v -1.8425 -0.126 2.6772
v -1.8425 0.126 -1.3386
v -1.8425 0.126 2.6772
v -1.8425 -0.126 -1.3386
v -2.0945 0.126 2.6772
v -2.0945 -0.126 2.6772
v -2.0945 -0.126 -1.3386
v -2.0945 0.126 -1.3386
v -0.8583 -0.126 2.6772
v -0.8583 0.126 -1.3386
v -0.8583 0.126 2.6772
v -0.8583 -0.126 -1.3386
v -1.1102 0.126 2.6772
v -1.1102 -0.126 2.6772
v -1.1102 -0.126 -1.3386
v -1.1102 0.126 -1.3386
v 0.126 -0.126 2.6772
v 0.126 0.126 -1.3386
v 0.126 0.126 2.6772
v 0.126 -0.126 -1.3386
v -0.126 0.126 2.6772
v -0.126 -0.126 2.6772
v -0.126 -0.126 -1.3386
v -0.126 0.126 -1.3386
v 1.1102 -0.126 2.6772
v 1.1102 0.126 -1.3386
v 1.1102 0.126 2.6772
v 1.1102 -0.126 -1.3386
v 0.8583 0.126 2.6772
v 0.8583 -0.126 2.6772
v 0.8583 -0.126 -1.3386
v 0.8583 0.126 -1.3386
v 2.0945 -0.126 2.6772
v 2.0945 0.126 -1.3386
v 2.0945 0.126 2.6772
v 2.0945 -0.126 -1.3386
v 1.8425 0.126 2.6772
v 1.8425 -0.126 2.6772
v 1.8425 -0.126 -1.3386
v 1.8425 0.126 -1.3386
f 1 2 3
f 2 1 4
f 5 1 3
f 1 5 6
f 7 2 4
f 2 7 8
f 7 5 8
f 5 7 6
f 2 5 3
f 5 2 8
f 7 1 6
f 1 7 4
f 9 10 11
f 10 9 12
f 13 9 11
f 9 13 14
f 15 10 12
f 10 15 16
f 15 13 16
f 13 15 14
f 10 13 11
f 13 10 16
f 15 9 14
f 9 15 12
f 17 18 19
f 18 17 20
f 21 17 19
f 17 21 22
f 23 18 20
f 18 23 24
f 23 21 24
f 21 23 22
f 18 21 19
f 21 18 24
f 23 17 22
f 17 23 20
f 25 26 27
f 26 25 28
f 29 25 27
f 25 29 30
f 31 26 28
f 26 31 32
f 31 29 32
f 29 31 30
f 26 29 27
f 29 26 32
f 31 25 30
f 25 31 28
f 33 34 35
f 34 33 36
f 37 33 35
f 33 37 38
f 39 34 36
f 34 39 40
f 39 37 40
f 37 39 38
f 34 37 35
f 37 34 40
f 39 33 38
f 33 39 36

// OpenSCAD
// file: defines.scad
// example012.stl is Mblock.stl, (c) 2009 Will Langford
// licensed under the Creative Commons - GNU GPL license.
// http://www.thingiverse.com/thing:753

//import("sim800c.stl", convexity=3);

// PCB

A = 2.5;
B = 14.9;

scale = 1/2.54;
// main file
include <defines.scad>

pitch = 2.5;
p_w = 0.64;
p_h = 7.0;

module Pin(x, y) {
  translate([x - p_w/2, y - p_w/2, -3.4])
    cube(size = [p_w, p_w, p_h + 3.2], center = false);
}

// Pins
scale(scale) color("Silver") {
  Pin(-pitch*2, 0);
  Pin(-pitch*1, 0);
  Pin(       0, 0);
  Pin( pitch*1, 0);
  Pin( pitch*2, 0);
}
